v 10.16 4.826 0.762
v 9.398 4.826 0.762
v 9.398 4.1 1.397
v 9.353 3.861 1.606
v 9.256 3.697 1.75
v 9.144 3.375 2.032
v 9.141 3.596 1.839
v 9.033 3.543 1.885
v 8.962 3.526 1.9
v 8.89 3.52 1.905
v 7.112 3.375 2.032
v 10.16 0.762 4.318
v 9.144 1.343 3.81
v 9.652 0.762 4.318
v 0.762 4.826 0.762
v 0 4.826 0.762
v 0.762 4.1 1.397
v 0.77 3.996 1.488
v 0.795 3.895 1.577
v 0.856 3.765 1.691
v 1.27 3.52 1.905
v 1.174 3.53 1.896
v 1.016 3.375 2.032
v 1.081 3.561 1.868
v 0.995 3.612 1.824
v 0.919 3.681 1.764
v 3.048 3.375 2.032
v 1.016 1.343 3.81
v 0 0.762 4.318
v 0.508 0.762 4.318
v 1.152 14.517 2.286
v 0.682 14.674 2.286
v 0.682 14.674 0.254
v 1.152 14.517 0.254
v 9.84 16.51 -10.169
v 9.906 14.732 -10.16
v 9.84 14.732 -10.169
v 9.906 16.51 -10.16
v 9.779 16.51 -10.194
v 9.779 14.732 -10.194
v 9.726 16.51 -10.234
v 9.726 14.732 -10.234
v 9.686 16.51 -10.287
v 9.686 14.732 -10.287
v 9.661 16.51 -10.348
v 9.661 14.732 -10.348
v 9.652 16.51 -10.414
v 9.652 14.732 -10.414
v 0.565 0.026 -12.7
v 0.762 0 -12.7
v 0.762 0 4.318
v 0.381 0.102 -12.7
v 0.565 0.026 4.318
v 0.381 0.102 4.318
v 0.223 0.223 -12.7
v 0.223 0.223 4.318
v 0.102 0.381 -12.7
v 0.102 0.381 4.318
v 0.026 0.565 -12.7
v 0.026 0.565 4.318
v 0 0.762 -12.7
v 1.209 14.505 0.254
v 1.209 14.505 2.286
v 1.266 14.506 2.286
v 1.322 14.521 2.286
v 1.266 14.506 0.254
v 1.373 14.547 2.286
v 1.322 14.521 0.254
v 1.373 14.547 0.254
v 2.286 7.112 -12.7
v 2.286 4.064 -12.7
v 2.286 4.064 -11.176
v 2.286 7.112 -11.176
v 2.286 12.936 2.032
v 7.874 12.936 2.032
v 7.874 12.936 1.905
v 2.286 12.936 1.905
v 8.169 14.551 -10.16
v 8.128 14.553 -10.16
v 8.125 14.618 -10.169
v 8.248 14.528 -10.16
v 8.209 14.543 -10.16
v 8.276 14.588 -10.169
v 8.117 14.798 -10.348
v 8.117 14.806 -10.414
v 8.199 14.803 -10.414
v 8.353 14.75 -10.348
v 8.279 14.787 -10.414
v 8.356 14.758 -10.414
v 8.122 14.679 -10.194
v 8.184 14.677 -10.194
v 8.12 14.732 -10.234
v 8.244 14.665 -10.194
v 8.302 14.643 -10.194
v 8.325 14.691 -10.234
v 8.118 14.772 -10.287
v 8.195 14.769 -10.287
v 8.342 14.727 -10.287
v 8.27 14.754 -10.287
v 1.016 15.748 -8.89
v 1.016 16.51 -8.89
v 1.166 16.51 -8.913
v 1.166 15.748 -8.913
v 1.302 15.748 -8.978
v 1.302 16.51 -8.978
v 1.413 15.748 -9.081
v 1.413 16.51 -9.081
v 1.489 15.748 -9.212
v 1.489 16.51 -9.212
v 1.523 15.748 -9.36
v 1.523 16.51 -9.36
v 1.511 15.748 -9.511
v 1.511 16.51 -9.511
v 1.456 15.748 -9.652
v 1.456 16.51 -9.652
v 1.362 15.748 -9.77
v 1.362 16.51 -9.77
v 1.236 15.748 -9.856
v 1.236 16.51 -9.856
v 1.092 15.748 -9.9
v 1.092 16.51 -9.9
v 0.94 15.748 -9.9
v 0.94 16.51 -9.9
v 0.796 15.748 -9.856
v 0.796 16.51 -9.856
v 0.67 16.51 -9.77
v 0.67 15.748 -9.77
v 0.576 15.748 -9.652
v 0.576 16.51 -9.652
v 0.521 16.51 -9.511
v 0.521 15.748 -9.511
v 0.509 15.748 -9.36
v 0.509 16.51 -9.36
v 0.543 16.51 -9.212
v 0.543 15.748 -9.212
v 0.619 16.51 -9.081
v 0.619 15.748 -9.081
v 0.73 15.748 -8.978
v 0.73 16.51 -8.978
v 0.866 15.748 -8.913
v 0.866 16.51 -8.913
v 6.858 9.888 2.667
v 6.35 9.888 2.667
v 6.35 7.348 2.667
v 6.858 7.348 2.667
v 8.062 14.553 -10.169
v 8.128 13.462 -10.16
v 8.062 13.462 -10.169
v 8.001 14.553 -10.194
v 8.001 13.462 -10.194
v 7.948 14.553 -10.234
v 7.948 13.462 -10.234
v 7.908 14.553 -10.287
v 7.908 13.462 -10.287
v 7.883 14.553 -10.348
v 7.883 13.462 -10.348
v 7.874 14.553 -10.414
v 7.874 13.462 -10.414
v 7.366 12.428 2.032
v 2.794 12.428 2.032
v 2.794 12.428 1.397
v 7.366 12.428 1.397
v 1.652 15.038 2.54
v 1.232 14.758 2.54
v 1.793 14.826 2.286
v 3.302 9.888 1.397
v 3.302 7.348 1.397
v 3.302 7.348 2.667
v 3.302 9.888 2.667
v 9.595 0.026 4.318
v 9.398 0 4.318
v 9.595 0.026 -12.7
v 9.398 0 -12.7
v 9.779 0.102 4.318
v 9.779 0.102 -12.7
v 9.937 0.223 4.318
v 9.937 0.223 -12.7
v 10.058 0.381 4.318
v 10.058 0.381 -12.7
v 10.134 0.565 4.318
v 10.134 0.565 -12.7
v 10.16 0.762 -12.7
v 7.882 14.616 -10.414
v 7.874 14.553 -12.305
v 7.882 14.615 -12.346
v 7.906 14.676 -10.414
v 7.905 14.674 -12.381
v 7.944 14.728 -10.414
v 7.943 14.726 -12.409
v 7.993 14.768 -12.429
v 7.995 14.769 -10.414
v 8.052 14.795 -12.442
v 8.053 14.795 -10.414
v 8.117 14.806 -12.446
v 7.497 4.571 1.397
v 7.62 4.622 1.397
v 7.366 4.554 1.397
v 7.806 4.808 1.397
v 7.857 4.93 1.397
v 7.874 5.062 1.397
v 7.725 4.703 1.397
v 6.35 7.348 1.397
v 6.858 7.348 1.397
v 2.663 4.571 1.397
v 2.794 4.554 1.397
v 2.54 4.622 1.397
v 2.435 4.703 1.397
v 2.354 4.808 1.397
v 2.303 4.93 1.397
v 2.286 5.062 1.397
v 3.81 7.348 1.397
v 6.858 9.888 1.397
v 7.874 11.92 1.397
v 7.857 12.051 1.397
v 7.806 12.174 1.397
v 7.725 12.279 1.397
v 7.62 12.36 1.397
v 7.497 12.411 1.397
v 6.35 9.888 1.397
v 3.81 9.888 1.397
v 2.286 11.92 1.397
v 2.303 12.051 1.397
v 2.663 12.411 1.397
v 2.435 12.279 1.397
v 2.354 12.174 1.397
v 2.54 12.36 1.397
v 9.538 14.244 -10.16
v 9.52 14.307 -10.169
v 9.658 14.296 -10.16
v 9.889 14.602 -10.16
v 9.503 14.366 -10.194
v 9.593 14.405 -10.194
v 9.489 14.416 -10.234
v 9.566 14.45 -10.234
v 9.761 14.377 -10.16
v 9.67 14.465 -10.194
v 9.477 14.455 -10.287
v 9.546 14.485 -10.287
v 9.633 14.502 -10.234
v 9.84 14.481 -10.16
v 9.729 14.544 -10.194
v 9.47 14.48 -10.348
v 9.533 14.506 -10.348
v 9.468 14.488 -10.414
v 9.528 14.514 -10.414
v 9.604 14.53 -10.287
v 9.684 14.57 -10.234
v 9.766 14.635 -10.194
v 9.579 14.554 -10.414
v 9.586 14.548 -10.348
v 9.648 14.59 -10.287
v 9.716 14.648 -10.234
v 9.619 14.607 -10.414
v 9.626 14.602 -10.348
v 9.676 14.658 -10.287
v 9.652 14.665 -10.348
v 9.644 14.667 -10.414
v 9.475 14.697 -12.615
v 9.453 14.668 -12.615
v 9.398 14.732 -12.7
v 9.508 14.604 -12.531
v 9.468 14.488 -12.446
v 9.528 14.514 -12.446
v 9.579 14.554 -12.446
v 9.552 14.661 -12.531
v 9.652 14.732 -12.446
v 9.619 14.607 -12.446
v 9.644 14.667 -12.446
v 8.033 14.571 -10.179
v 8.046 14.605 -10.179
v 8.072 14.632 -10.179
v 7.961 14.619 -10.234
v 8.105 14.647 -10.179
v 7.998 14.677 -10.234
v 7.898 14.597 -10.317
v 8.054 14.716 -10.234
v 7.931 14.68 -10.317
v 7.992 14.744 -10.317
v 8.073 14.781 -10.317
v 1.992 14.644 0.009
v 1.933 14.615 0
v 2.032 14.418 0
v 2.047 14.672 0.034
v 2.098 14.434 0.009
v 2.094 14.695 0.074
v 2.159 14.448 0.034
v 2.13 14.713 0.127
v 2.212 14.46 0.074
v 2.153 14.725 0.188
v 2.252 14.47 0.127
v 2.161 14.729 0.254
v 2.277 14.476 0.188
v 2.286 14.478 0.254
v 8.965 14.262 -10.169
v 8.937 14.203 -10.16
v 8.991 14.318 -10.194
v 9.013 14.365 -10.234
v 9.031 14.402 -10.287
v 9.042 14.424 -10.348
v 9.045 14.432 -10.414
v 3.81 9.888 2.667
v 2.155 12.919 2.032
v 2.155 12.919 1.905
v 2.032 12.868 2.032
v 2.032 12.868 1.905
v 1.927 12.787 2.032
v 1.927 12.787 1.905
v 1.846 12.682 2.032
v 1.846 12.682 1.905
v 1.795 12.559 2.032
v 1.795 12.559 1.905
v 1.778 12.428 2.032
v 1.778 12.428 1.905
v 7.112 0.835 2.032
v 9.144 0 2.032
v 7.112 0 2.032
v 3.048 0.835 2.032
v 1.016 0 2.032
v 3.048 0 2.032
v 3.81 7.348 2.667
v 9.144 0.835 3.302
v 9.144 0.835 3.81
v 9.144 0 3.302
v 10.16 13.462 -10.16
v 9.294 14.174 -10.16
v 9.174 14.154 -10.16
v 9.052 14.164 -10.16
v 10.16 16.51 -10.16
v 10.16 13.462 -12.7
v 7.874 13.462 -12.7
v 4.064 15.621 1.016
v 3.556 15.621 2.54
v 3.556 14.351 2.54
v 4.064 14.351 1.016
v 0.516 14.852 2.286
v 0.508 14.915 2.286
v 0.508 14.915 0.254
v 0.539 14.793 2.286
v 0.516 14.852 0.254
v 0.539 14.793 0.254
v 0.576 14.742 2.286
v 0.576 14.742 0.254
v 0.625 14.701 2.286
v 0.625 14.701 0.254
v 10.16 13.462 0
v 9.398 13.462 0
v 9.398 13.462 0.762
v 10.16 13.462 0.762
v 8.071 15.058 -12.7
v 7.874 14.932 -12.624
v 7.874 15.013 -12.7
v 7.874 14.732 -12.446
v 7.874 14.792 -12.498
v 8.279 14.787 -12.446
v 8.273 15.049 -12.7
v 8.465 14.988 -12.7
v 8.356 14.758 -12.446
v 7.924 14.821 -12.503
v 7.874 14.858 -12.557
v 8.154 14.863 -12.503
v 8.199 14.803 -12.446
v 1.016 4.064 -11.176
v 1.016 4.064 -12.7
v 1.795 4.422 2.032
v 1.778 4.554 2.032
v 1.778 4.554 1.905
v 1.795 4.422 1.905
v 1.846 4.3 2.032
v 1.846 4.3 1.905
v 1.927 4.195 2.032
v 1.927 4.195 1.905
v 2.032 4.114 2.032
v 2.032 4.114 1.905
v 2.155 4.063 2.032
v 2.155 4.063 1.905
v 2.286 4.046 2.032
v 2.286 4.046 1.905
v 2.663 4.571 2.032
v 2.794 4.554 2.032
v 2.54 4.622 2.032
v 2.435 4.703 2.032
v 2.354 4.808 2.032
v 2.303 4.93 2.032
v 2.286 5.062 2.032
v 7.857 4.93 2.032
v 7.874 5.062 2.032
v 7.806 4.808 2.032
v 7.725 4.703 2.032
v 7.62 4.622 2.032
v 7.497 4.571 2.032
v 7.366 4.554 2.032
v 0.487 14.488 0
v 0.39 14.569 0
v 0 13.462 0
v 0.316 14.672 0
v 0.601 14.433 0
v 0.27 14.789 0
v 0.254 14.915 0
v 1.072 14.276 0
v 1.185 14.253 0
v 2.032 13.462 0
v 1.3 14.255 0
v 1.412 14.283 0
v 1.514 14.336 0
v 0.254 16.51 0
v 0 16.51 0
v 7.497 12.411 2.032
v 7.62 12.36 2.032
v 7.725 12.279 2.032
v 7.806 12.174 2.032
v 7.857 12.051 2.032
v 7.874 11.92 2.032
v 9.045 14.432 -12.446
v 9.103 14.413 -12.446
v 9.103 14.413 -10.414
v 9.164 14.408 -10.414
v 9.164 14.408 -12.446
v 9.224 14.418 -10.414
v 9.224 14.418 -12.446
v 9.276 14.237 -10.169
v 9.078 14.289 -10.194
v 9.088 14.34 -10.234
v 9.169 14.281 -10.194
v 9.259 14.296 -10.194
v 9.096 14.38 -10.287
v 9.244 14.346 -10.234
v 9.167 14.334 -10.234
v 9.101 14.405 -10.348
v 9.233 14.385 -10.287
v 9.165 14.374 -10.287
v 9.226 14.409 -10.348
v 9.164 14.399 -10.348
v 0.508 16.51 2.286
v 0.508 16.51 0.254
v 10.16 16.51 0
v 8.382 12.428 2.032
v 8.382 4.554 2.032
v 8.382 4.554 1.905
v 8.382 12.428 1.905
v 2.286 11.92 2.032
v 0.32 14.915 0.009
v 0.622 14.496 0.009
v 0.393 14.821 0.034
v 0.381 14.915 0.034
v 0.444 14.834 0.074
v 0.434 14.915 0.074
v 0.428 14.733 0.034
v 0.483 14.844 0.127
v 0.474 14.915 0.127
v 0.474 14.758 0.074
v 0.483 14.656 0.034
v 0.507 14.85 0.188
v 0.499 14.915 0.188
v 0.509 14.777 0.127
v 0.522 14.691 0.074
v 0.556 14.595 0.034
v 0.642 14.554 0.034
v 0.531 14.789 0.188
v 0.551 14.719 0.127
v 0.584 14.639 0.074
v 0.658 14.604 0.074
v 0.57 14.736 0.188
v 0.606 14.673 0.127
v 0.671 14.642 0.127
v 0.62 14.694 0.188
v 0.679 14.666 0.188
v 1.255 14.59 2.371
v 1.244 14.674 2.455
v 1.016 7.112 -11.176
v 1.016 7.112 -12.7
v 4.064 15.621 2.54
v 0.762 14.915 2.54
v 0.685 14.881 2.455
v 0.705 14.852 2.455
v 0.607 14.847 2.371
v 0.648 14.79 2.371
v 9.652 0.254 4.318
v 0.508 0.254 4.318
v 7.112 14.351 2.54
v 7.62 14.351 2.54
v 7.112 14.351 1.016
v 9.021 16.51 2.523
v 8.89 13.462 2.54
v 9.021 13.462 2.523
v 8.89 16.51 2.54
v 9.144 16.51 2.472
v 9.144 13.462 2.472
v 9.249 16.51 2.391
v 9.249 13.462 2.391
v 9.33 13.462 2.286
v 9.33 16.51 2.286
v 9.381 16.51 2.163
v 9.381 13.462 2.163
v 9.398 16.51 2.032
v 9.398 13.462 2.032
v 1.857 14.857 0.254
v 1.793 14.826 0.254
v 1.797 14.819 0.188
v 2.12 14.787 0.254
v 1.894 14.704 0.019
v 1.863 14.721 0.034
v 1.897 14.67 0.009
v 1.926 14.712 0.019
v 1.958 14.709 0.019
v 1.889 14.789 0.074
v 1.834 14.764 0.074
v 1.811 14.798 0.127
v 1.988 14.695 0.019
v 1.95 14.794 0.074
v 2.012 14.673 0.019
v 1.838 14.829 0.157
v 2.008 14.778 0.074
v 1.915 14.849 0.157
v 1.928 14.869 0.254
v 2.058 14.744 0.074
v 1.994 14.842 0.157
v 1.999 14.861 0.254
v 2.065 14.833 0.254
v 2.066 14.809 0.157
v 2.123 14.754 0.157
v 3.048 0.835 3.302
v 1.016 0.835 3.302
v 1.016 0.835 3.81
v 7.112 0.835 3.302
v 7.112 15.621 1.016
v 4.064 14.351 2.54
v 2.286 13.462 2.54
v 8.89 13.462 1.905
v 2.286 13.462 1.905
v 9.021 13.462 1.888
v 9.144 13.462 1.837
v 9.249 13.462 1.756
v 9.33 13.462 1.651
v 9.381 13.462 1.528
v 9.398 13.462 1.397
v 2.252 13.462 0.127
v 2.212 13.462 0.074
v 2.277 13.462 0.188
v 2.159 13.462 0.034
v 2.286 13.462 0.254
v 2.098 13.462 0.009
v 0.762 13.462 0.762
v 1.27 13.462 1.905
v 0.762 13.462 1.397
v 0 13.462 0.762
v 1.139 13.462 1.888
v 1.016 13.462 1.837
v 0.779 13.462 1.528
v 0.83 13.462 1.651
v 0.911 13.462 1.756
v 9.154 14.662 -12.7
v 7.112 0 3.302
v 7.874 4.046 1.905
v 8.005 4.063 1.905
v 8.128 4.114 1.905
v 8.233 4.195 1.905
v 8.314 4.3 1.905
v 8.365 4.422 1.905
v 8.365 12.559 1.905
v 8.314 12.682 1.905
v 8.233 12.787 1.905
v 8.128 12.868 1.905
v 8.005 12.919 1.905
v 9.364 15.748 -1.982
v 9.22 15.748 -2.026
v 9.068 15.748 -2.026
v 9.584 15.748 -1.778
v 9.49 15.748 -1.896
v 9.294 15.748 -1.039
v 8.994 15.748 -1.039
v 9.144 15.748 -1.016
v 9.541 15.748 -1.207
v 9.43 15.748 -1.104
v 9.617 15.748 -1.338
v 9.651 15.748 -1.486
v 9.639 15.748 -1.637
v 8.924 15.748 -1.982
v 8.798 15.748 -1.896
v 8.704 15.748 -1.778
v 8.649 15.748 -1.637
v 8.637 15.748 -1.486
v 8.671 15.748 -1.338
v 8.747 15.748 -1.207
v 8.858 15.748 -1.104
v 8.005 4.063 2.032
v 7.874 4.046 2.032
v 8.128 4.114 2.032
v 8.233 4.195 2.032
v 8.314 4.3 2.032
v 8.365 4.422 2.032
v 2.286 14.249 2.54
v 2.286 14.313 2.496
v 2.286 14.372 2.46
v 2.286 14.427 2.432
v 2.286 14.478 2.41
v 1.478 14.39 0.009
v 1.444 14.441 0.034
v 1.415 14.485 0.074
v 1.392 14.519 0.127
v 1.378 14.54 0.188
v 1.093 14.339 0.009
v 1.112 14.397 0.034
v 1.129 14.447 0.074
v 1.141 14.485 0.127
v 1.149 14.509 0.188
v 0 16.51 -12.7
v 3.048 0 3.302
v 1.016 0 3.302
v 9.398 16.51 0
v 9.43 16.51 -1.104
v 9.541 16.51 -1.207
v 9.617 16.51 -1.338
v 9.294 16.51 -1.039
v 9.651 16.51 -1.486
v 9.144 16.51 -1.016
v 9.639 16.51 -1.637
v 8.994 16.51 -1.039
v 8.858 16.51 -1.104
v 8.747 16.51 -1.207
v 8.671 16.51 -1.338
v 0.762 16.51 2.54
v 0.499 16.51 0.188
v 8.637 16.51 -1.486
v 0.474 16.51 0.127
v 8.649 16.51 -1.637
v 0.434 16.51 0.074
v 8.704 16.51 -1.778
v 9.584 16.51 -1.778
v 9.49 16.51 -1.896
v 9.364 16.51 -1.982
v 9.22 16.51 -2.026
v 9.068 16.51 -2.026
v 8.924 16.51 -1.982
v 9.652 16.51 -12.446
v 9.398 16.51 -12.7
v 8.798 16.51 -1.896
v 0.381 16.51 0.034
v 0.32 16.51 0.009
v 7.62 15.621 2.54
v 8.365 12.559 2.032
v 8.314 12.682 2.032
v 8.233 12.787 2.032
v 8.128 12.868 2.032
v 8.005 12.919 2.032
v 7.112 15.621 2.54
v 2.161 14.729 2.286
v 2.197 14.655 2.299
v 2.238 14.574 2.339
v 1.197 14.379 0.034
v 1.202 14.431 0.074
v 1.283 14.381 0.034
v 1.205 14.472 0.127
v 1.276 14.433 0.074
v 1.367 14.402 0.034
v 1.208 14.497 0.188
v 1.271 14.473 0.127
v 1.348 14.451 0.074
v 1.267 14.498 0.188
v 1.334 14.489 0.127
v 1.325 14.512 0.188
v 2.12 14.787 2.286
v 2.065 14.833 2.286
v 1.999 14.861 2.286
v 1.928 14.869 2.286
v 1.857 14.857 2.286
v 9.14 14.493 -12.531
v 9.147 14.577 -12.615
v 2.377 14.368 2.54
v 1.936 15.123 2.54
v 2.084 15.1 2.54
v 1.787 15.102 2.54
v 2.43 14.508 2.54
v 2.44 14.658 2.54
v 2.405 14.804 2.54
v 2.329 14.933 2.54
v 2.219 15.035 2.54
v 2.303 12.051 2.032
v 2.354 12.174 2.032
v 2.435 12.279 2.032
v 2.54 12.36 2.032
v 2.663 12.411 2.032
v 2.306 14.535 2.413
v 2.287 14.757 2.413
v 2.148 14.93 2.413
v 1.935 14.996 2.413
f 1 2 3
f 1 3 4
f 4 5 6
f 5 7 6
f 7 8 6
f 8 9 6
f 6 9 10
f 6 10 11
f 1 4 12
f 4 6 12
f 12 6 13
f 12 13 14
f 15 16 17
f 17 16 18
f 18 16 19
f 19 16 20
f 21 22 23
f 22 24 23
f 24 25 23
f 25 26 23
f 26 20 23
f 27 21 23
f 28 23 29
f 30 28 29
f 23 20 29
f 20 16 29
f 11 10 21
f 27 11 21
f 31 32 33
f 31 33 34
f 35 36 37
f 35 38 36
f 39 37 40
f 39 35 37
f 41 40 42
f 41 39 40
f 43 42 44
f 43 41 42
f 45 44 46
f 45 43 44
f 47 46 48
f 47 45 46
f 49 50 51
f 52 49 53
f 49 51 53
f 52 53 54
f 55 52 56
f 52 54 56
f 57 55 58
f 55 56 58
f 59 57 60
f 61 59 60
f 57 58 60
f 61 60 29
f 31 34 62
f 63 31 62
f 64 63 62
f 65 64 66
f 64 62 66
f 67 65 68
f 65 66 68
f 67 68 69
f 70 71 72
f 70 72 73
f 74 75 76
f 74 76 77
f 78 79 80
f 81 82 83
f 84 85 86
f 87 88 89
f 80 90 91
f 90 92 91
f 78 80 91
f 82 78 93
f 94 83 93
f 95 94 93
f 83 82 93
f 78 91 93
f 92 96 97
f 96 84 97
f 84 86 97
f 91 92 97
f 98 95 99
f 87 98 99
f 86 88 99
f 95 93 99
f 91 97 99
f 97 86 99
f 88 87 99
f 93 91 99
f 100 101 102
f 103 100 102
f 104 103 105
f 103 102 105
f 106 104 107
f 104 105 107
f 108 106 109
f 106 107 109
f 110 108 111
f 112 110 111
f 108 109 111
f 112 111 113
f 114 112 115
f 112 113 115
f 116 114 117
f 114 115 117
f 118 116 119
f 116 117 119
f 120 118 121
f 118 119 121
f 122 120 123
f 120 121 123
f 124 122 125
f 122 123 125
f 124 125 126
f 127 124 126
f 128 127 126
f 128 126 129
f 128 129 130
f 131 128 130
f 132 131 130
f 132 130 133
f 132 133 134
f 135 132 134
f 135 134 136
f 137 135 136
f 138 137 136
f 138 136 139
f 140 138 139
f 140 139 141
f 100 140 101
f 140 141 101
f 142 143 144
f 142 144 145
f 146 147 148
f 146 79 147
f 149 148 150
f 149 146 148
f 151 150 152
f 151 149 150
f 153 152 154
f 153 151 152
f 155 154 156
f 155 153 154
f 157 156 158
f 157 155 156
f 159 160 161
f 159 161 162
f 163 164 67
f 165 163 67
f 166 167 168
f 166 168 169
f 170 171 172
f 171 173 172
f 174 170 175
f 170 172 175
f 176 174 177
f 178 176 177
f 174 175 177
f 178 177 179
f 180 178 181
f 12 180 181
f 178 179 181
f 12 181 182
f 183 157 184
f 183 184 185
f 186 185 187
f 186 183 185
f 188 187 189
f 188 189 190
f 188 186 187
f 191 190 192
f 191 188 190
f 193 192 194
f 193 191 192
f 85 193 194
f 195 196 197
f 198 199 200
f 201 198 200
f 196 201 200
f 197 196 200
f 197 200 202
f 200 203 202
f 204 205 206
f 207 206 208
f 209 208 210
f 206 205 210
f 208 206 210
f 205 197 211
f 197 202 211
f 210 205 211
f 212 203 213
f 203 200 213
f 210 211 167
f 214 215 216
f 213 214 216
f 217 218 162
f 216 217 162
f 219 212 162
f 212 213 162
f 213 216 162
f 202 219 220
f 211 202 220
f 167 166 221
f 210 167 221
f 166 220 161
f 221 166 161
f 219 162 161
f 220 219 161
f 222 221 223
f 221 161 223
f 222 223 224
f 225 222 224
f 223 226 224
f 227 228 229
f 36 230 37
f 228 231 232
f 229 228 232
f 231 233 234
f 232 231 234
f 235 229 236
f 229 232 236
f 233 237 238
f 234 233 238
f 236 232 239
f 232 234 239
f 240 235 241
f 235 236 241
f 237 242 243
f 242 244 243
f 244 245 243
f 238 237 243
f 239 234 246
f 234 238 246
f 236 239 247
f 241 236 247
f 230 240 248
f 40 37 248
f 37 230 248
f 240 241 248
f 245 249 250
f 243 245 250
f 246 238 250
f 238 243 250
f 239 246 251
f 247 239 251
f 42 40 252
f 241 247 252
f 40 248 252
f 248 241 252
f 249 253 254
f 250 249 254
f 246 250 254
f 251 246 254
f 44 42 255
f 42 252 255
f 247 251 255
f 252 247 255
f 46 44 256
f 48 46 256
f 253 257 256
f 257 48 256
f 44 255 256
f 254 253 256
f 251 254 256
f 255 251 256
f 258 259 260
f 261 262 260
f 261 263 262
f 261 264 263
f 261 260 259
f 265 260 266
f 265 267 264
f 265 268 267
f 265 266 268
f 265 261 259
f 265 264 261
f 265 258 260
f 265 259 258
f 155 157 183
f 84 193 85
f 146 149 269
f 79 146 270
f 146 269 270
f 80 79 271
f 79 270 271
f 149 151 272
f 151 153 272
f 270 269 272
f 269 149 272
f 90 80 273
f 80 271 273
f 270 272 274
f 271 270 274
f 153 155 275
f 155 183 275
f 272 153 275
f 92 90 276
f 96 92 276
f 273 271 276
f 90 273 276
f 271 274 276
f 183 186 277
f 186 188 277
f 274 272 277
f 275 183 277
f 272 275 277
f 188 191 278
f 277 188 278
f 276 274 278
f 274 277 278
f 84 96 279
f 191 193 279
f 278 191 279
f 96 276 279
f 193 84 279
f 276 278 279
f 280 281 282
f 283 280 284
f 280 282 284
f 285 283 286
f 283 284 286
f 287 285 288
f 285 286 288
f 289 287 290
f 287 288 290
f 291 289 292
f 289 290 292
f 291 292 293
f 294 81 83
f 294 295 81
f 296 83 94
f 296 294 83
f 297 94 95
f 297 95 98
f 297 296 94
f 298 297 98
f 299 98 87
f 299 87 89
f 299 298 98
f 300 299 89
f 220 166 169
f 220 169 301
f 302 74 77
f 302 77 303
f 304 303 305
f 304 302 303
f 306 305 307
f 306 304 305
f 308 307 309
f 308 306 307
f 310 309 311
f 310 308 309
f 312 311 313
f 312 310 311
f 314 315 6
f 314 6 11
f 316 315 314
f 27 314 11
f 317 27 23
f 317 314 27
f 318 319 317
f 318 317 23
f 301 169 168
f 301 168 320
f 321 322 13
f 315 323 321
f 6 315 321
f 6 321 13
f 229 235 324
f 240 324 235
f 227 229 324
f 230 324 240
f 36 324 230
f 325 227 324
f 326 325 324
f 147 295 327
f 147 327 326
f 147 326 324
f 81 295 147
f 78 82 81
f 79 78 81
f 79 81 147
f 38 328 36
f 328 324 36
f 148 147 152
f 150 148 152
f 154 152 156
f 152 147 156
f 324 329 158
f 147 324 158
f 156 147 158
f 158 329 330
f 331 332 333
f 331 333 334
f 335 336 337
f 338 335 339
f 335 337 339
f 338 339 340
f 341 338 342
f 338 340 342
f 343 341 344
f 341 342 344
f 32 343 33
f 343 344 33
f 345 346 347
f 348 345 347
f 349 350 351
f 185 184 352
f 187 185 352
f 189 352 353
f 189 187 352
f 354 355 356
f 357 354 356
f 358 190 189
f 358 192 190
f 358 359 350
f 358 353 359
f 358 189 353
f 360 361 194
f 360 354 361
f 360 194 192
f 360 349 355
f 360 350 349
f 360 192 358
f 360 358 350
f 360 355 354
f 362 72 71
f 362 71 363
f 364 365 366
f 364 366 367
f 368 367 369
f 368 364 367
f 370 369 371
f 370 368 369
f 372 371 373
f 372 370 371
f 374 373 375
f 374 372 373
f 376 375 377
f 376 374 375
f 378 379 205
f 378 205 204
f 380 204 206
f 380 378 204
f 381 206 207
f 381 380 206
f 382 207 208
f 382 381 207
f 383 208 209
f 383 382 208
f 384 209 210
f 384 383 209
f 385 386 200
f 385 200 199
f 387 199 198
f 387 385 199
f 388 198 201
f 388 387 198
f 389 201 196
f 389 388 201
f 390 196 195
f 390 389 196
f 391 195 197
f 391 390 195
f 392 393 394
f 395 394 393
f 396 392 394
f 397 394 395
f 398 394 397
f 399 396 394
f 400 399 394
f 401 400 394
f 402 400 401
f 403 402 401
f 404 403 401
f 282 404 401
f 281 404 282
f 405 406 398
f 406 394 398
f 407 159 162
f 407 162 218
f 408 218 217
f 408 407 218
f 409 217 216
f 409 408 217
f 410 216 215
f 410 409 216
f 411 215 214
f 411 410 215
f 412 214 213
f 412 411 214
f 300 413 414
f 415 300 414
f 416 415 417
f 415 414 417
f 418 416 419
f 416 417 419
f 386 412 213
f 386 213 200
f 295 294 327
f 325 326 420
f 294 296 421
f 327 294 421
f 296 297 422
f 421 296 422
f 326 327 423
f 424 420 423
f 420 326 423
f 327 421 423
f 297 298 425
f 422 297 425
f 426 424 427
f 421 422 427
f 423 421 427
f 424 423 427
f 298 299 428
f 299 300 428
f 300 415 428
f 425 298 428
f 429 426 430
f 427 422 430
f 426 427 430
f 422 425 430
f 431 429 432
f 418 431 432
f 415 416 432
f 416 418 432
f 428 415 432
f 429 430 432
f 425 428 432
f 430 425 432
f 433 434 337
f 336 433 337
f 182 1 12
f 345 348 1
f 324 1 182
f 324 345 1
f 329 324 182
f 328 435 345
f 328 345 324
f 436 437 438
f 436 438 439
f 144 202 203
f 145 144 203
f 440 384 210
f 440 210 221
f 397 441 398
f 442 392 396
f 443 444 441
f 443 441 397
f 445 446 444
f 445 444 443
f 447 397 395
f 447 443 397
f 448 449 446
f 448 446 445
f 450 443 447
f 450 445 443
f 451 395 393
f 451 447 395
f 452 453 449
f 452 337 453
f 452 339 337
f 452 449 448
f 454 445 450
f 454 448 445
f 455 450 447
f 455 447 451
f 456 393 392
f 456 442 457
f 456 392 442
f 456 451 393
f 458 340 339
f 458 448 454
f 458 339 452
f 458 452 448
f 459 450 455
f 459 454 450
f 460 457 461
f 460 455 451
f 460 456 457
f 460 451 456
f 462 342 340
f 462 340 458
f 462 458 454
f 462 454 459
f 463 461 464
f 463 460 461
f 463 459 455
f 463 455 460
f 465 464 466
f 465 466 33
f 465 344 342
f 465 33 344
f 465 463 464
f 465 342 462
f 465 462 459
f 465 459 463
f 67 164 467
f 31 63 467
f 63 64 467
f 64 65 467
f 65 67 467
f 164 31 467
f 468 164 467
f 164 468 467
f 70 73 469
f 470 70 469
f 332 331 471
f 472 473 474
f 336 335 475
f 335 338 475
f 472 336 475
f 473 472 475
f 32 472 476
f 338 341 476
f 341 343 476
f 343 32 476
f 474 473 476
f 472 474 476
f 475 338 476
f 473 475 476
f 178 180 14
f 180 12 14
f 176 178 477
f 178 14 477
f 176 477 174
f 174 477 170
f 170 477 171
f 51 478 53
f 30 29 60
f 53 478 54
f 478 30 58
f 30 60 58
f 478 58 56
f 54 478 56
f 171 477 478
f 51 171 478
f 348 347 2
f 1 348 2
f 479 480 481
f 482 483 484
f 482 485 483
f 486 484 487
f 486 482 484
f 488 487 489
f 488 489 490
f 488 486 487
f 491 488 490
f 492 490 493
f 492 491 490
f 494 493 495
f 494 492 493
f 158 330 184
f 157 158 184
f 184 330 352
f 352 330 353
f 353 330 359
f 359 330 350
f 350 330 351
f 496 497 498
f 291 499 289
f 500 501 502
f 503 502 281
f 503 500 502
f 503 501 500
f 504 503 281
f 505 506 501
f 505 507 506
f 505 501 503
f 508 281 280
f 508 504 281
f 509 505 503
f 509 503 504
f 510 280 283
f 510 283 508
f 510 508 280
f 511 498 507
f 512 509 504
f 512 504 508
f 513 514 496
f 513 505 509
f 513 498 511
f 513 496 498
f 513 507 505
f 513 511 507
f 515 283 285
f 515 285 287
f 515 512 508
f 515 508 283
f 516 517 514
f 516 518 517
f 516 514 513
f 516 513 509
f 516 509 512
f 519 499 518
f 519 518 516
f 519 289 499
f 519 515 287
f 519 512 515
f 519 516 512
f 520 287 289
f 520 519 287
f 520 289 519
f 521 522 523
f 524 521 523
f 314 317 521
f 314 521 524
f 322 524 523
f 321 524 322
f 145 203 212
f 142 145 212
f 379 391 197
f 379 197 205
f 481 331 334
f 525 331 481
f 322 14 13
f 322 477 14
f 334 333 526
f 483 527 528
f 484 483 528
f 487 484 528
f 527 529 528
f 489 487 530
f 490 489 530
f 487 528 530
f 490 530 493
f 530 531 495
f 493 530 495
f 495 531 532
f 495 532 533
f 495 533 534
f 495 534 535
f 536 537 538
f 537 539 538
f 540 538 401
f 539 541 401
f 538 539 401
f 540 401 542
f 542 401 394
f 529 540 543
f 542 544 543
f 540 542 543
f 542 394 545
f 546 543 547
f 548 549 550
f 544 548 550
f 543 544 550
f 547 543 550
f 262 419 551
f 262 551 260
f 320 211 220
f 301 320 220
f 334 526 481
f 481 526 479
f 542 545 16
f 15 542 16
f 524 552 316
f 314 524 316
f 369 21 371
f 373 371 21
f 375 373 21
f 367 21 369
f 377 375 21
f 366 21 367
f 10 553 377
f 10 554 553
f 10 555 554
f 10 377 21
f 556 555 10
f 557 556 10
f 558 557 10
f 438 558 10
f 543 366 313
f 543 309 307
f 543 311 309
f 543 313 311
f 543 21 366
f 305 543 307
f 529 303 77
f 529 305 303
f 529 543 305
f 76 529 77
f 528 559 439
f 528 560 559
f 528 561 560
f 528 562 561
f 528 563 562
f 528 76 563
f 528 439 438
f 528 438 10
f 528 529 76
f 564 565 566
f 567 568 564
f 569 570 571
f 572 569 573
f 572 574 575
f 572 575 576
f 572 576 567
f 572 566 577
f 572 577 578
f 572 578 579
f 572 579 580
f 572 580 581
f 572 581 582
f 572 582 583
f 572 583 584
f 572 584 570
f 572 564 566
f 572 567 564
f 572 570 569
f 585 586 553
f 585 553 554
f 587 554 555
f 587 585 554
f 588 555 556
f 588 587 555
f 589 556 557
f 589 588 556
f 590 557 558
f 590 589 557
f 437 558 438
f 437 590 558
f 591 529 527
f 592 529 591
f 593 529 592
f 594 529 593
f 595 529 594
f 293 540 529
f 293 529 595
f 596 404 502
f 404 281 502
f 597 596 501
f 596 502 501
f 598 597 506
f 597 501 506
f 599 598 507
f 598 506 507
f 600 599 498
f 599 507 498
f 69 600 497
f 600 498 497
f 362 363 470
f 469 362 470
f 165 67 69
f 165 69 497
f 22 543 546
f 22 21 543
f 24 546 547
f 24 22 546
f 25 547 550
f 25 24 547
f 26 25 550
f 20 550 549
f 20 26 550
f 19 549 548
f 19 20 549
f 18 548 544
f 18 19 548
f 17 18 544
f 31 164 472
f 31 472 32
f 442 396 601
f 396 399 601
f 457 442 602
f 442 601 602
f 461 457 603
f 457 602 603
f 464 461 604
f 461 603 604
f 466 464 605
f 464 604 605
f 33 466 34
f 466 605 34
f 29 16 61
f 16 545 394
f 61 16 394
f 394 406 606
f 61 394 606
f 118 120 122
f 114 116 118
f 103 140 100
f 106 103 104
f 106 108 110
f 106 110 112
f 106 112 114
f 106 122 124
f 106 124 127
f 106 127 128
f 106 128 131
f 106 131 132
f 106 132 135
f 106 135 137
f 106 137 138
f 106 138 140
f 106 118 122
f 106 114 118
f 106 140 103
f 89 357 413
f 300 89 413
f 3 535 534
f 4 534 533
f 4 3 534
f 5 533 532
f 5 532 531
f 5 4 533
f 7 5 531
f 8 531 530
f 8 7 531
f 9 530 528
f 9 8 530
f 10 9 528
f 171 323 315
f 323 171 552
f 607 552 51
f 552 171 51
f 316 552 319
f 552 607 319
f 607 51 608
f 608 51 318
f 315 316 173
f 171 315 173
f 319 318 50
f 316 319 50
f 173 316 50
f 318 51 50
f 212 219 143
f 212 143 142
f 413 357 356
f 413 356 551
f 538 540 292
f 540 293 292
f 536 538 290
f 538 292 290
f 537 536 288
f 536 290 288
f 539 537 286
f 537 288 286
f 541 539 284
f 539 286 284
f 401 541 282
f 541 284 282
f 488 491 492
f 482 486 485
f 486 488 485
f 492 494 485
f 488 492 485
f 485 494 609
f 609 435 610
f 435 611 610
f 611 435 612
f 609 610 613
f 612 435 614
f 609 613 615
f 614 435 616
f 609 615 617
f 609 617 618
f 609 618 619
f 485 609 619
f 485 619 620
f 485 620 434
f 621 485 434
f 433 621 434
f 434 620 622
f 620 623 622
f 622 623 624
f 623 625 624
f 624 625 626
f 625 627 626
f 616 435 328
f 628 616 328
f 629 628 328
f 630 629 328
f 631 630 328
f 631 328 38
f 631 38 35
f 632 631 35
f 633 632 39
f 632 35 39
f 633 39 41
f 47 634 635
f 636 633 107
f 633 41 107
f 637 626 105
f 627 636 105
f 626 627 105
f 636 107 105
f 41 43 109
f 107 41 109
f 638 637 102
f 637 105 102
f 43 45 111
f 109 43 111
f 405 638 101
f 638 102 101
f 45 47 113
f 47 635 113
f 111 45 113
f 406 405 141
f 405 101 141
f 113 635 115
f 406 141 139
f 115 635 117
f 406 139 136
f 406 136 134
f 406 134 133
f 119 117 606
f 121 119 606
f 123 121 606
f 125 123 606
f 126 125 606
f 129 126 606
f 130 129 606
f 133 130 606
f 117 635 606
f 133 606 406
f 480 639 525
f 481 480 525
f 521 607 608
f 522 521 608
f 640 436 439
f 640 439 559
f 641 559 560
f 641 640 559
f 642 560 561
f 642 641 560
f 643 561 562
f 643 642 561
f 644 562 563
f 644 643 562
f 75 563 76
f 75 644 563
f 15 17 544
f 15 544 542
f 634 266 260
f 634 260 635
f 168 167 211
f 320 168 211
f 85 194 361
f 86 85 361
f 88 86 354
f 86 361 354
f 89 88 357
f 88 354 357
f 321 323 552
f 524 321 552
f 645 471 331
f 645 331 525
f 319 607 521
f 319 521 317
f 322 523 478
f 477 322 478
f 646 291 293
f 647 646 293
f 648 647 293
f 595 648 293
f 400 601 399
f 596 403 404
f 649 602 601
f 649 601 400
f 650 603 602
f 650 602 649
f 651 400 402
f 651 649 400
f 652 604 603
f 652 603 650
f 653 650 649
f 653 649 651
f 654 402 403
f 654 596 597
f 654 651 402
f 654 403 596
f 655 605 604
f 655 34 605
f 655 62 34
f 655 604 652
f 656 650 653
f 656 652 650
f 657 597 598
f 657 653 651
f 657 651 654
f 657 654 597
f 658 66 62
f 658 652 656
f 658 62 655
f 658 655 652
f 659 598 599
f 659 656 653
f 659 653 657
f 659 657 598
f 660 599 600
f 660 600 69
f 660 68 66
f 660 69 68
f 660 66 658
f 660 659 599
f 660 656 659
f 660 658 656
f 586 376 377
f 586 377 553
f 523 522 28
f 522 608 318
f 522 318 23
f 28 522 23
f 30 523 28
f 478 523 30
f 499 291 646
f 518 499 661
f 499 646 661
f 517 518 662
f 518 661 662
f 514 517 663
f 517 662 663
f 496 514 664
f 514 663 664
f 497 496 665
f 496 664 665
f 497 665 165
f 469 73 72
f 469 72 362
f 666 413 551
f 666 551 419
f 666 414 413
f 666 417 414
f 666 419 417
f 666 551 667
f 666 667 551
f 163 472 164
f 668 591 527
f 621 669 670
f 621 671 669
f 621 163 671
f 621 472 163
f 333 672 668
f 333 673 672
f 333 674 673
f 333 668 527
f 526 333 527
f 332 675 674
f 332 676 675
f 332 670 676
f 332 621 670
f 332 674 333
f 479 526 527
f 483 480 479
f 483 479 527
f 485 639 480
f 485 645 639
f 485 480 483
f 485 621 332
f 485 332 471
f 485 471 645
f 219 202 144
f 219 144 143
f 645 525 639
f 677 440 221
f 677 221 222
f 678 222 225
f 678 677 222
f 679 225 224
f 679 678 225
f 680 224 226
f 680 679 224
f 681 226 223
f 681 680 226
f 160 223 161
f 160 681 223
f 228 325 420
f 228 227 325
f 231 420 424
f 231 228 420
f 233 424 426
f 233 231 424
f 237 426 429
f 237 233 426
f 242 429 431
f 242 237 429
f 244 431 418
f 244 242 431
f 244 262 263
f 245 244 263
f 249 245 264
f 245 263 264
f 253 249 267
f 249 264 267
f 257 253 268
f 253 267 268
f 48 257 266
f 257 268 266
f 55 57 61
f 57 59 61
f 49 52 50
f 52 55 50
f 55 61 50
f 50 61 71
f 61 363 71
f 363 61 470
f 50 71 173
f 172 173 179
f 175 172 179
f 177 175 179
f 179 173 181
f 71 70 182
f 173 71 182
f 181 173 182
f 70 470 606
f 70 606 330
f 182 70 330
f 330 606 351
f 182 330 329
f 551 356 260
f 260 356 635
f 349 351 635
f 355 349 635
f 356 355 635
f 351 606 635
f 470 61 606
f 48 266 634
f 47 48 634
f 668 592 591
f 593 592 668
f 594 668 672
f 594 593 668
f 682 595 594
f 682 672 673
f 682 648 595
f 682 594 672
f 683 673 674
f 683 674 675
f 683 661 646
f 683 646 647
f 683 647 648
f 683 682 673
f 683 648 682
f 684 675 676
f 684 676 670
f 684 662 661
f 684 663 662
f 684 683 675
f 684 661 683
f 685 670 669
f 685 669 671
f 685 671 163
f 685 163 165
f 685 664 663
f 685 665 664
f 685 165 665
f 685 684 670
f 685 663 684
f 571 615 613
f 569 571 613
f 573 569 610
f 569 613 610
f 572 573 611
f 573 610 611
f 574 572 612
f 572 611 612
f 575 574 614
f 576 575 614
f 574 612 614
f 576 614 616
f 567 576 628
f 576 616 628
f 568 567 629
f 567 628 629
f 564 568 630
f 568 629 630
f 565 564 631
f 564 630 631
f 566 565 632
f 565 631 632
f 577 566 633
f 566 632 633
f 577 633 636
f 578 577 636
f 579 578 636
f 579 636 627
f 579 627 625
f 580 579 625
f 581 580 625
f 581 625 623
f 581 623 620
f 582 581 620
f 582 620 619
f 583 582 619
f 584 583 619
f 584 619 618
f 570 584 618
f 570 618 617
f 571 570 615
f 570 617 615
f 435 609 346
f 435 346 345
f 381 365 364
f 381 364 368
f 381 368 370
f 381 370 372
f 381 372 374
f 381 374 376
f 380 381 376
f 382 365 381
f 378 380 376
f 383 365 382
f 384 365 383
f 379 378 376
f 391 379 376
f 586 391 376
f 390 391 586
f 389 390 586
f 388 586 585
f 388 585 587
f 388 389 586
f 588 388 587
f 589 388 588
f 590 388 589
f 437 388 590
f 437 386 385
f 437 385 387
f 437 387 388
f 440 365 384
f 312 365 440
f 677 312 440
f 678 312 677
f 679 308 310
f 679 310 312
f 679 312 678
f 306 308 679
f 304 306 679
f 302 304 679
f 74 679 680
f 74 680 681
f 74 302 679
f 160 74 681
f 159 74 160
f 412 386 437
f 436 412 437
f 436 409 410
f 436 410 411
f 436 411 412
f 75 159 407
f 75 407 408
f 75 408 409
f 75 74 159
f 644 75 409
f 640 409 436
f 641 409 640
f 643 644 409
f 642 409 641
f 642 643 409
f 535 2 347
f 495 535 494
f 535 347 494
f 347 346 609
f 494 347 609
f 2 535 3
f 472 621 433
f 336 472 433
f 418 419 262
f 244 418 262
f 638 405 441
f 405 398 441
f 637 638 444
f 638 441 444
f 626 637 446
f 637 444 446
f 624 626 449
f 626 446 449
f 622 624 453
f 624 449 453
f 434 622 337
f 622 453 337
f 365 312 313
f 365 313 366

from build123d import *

# Parameters (mm, degrees)
SKETCH1_W           = 10.16
SKETCH1_H           = 16.51
BOSS_EXTRUDE1_DEPTH = 12.7
BOSS_EXTRUDE2_DEPTH = 10.16
SKETCH3_W           = 1.27
SKETCH3_H           = 3.048
CUT_EXTRUDE1_DEPTH  = 1.524
CUT_EXTRUDE2_DEPTH  = 2.54
SKETCH6_W           = 2.032
SKETCH6_H           = 1.27
CUT_EXTRUDE5_DEPTH  = 24.17532524
SKETCH8_W           = 8.128
SKETCH8_H           = 2.032
CUT_EXTRUDE6_DEPTH  = 2.54
CUT_EXTRUDE7_DEPTH  = 8.128
CUT_EXTRUDE8_START  = -1.778
SKETCH10_W          = 8.128
SKETCH10_H          = 0.508
CUT_EXTRUDE8_DEPTH  = 1.778
CUT_EXTRUDE9_DEPTH  = 1.778
BOSS_EXTRUDE3_REACH = 23.113
SKETCH12_W          = 8.636
SKETCH12_H          = 1.143
CUT_EXTRUDE10_DEPTH = 0.508
BOSS_EXTRUDE4_START = 0.127
BOSS_EXTRUDE4_DEPTH = 0.127
SKETCH16_W          = 0.508
SKETCH16_H          = 2.54
BOSS_EXTRUDE5_DEPTH = 1.27
SKETCH18_W          = 7.112
SKETCH18_H          = 3.048
BOSS_EXTRUDE6_DEPTH = 2.54
SKETCH19_W          = 3.048
SKETCH19_H          = 1.27
CUT_EXTRUDE11_DEPTH = 1.524
CUT_EXTRUDE12_DEPTH = 1.524
SKETCH22_R          = 0.508
CUT_EXTRUDE13_DEPTH = 0.762
BOSS_EXTRUDE8_DEPTH = 2.54
FILLET1_R           = 0.762
FILLET2_R           = 0.508
FILLET3_R           = 0.508
FILLET4_R           = 0.254
CHAMFER2_SIZE       = 0.254
FILLET5_R           = 0.254
CHAMFER3_SIZE       = 0.254
FILLET6_R           = 0.254
FILLET8_R           = 0.254


# Some blends are built 0.0001 mm under size
with BuildPart() as part:
    # Sketch1 → Boss-Extrude1 (new body)
    with BuildSketch(Plane.XY):
        with Locations((5.08, 8.255)):
            Rectangle(SKETCH1_W, SKETCH1_H)
    extrude(amount=-BOSS_EXTRUDE1_DEPTH)

    # Sketch2 → Boss-Extrude2 (add)
    with BuildSketch(Plane.ZY):
        Polygon((0, 13.462), (0.762, 13.462), (0.762, 4.826), (4.318, 0.762), (4.318, 0), (0, 0), align=None)
    extrude(amount=-BOSS_EXTRUDE2_DEPTH)

    # Sketch3 → Cut-Extrude1 (cut)
    with BuildSketch(Plane(origin=(0, 0, -12.7), x_dir=(-1, 0, 0), z_dir=(0, 0, -1))):
        with Locations((-1.651, 5.588)):
            Rectangle(SKETCH3_W, SKETCH3_H)
    extrude(amount=-CUT_EXTRUDE1_DEPTH, mode=Mode.SUBTRACT)

    # Sketch4 → Cut-Extrude2 (cut)
    with BuildSketch(Plane(origin=(0, 0, -12.7), x_dir=(-1, 0, 0), z_dir=(0, 0, -1))):
        with BuildLine():
            Line((-10.16, 13.462), (-7.874, 13.462))
            Line((-7.874, 13.462), (-7.874, 14.732))
            ThreePointArc((-7.874, 14.732), (-8.111909378, 14.806021803), (-8.356399754, 14.758016014))
            Line((-8.356399754, 14.758016014), (-9.045285349, 14.432315787))
            ThreePointArc((-9.045285349, 14.432315787), (-9.133273497, 14.40877931), (-9.223907772, 14.41779641))
            Line((-9.223907772, 14.41779641), (-9.468055681, 14.487852091))
            ThreePointArc((-9.468055681, 14.487852091), (-9.600867128, 14.579157177), (-9.652, 14.732))
            Line((-9.652, 14.732), (-9.652, 16.51))
            Line((-9.652, 16.51), (-10.16, 16.51))
            Line((-10.16, 16.51), (-10.16, 13.462))
        make_face()
    extrude(amount=-CUT_EXTRUDE2_DEPTH, mode=Mode.SUBTRACT)

    # Sketch6 → Cut-Extrude5 (cut, through all)
    with BuildSketch(Plane(origin=(0, 0, 0), x_dir=(-1, 0, 0), z_dir=(0, -1, 0))):
        with Locations((-2.032, -2.667)):
            Rectangle(SKETCH6_W, SKETCH6_H)
        with Locations((-8.128, -2.667)):
            Rectangle(SKETCH6_W, SKETCH6_H)
    extrude(amount=-CUT_EXTRUDE5_DEPTH, mode=Mode.SUBTRACT)

    # Sketch8 → Cut-Extrude6 (cut)
    with BuildSketch(Plane.XY.offset(2.032)):
        with Locations((5.08, 2.358571429)):
            Rectangle(SKETCH8_W, SKETCH8_H)
    extrude(amount=CUT_EXTRUDE6_DEPTH, mode=Mode.SUBTRACT)

    # 3DSketch3 → Cut-Extrude7 (cut, along a direction that is not the sketch's normal)
    with BuildSketch(Plane(origin=(0.508, 0.762, 4.318), x_dir=(0.5499719409228688, 0.6285393610547091, -0.5499719409228716), z_dir=(-0.7071067811865493, 0, -0.7071067811865457))):
        Polygon((0, 0), (-0.319297995, 0.395111111), (0.604385491, 0.395111111), (0.923683487, 0), align=None)
    extrude(amount=-CUT_EXTRUDE7_DEPTH, dir=(-1, 0, 0), mode=Mode.SUBTRACT)

    # Sketch10 → Cut-Extrude8 (cut)
    with BuildSketch(Plane.XY.offset(3.81).offset(CUT_EXTRUDE8_START)):
        with Locations((5.08, 1.088571429)):
            Rectangle(SKETCH10_W, SKETCH10_H)
    extrude(amount=CUT_EXTRUDE8_DEPTH, mode=Mode.SUBTRACT)

    # 3DSketch6 → Cut-Extrude9 (cut, along a direction that is not the sketch's normal)
    with BuildSketch(Plane(origin=(9.652, 0.762, 4.318), x_dir=(-0.5499719409228674, 0.6285393610547109, -0.5499719409228712), z_dir=(-0.7071067811865499, 0, 0.7071067811865451))):
        Polygon((0, 0), (0.923683487, 0), (0.604385491, 0.395111111), (-0.319297995, 0.395111111), align=None)
    extrude(amount=CUT_EXTRUDE9_DEPTH, dir=(-1, 0, 0), mode=Mode.SUBTRACT)

    # Boss-Extrude3: up to this plane
    boss_extrude3_end = Plane(origin=(10.16, 0.762, 4.318), z_dir=(0, 0.6585046078685179, 0.752576694706878))
    # Sketch12 → Boss-Extrude3 (add, up to the surface)
    with BuildSketch(Plane(origin=(0, 13.462, 0), x_dir=(1, 0, 0), z_dir=(0, 1, 0)), mode=Mode.PRIVATE) as boss_extrude3_sk1:
        with Locations((5.08, -1.3335)):
            Rectangle(SKETCH12_W, SKETCH12_H)
    boss_extrude3_tool1 = split(extrude(boss_extrude3_sk1.sketch, amount=-BOSS_EXTRUDE3_REACH, mode=Mode.PRIVATE), bisect_by=boss_extrude3_end, keep=Keep.BOTH, mode=Mode.PRIVATE)
    add(boss_extrude3_tool1.solids().sort_by_distance((5.08, 13.462, 1.3335))[0])

    # Sketch13 → Cut-Extrude10 (cut)
    with BuildSketch(Plane.XY.offset(1.905)):
        with BuildLine():
            Line((2.794, 12.427857143), (7.366, 12.427857143))
            ThreePointArc((7.366, 12.427857143), (7.725210245, 12.279067388), (7.874, 11.919857143))
            Line((7.874, 11.919857143), (7.874, 5.061857143))
            ThreePointArc((7.874, 5.061857143), (7.725210245, 4.702646898), (7.366, 4.553857143))
            Line((7.366, 4.553857143), (2.794, 4.553857143))
            ThreePointArc((2.794, 4.553857143), (2.434789755, 4.702646898), (2.286, 5.061857143))
            Line((2.286, 5.061857143), (2.286, 11.919857143))
            ThreePointArc((2.286, 11.919857143), (2.434789755, 12.279067388), (2.794, 12.427857143))
        make_face()
    extrude(amount=-CUT_EXTRUDE10_DEPTH, mode=Mode.SUBTRACT)

    # Sketch14 → Boss-Extrude4 (add)
    with BuildSketch(Plane.XY.offset(1.905).offset(BOSS_EXTRUDE4_START)):
        with BuildLine():
            Line((2.286, 4.045857143), (7.874, 4.045857143))
            ThreePointArc((7.874, 4.045857143), (8.233210245, 4.194646898), (8.382, 4.553857143))
            Line((8.382, 4.553857143), (8.382, 12.427857143))
            ThreePointArc((8.382, 12.427857143), (8.233210245, 12.787067388), (7.874, 12.935857143))
            Line((7.874, 12.935857143), (2.286, 12.935857143))
            ThreePointArc((2.286, 12.935857143), (1.926789755, 12.787067388), (1.778, 12.427857143))
            Line((1.778, 12.427857143), (1.778, 4.553857143))
            ThreePointArc((1.778, 4.553857143), (1.926789755, 4.194646898), (2.286, 4.045857143))
        make_face()
        with BuildLine():
            Line((2.794, 12.427857143), (7.366, 12.427857143))
            ThreePointArc((7.366, 12.427857143), (7.725210245, 12.279067388), (7.874, 11.919857143))
            Line((7.874, 11.919857143), (7.874, 5.061857143))
            ThreePointArc((7.874, 5.061857143), (7.725210245, 4.702646898), (7.366, 4.553857143))
            Line((7.366, 4.553857143), (2.794, 4.553857143))
            ThreePointArc((2.794, 4.553857143), (2.434789755, 4.702646898), (2.286, 5.061857143))
            Line((2.286, 5.061857143), (2.286, 11.919857143))
            ThreePointArc((2.286, 11.919857143), (2.434789755, 12.279067388), (2.794, 12.427857143))
        make_face(mode=Mode.SUBTRACT)
    extrude(amount=-BOSS_EXTRUDE4_DEPTH)

    # Sketch16 → Boss-Extrude5 (add)
    with BuildSketch(Plane.XY.offset(1.397)):
        with Locations((3.556, 8.617857143)):
            Rectangle(SKETCH16_W, SKETCH16_H)
        with Locations((6.604, 8.617857143)):
            Rectangle(SKETCH16_W, SKETCH16_H)
    extrude(amount=BOSS_EXTRUDE5_DEPTH)

    # Sketch18 → Boss-Extrude6 (add)
    with BuildSketch(Plane.XY):
        with Locations((5.842, 14.986)):
            Rectangle(SKETCH18_W, SKETCH18_H)
    extrude(amount=BOSS_EXTRUDE6_DEPTH)

    # Sketch19 → Cut-Extrude11 (cut)
    with BuildSketch(Plane.XY.offset(2.54)):
        with Locations((5.588, 14.986)):
            Rectangle(SKETCH19_W, SKETCH19_H)
    extrude(amount=-CUT_EXTRUDE11_DEPTH, mode=Mode.SUBTRACT)

    # 3DSketch8 → Cut-Extrude12 (cut, along a direction that is not the sketch's normal)
    with BuildSketch(Plane(origin=(4.064, 15.621, 1.016), x_dir=(-0.24806946917841682, -0.6201736729460425, 0.7442084075352507), z_dir=(-0.9486832980505139, 0, -0.31622776601683783))):
        Polygon((0, 0), (1.260192903, 0.996269967), (2.047813468, 0), (0.787620565, -0.996269967), align=None)
    cut_extrude12 = extrude(amount=-CUT_EXTRUDE12_DEPTH, dir=(-1, 0, 0), mode=Mode.SUBTRACT)

    # Mirror1: Cut-Extrude12 across plane
    add(cut_extrude12.mirror(Plane(origin=(5.588, 0, 0), x_dir=(0, 0, 1), z_dir=(1, 0, 0))), mode=Mode.SUBTRACT)

    # Sketch22 → Cut-Extrude13 (cut)
    with BuildSketch(Plane(origin=(0, 16.51, 0), x_dir=(1, 0, 0), z_dir=(0, 1, 0))):
        with Locations(Location((9.144, 1.524, 0), (0, 0, 270))):
            Circle(SKETCH22_R)
        with Locations(Location((1.016, 9.398, 0), (0, 0, 270))):
            Circle(SKETCH22_R)
    extrude(amount=-CUT_EXTRUDE13_DEPTH, mode=Mode.SUBTRACT)

    # Sketch23 → Boss-Extrude8 (add)
    with BuildSketch(Plane.XY):
        with BuildLine():
            Line((2.286, 16.51), (0.508, 16.51))
            Line((0.508, 16.51), (0.508, 14.915072842))
            ThreePointArc((0.508, 14.915072842), (0.555944485, 14.76655643), (0.681678147, 14.674107284))
            Line((0.681678147, 14.674107284), (1.152147648, 14.517284117))
            ThreePointArc((1.152147648, 14.517284117), (1.266183721, 14.506497115), (1.37336335, 14.5469089))
            Line((1.37336335, 14.5469089), (2.032, 14.986))
            Line((2.032, 14.986), (2.286, 14.478))
            Line((2.286, 14.478), (2.286, 16.51))
        make_face()
    extrude(amount=BOSS_EXTRUDE8_DEPTH)

    # Fillet1
    fillet1_edges = [part.edges().sort_by_distance(p)[0] for p in [
        (10.16, 0, -4.191),
        (0, 0, -4.191),
    ]]
    fillet(fillet1_edges, radius=FILLET1_R)

    # Fillet2
    fillet2_edges = [part.edges().sort_by_distance(p)[0] for p in [
        (9.398, 8.490857143, 1.905),
        (0.762, 8.490857143, 1.905),
    ]]
    fillet(fillet2_edges, radius=FILLET2_R)

    # Fillet3
    fillet3_edges = [part.edges().sort_by_distance(p)[0] for p in [
        (9.398, 14.986, 2.54),
    ]]
    fillet(fillet3_edges, radius=FILLET3_R)

    # Fillet4
    fillet4_edges = [part.edges().sort_by_distance(p)[0] for p in [
        (2.032, 14.986, 1.27),
    ]]
    fillet(fillet4_edges, radius=FILLET4_R)

    # Chamfer2
    # the kernel refuses this chamfer: 0.254 mm, written as the material it takes off along each edge
    with BuildSketch(Plane(origin=(1.933490778, 14.615057177, 2.54), x_dir=(-0.512799244946166, -0.8585085523060572, 0), z_dir=(-0.8585085523060572, 0.512799244946166, 0))) as chamfer2_piece_1:
        Polygon((0.254 + CHAMFER2_SIZE, 0), (0.254, -CHAMFER2_SIZE), (0.254, 0), align=None)
    revolve(axis=Axis((1.933490778, 14.615057177, 2.54), (0, 0, 1)), revolution_arc=244.54053411, mode=Mode.SUBTRACT)
    with BuildSketch(Plane(origin=(1.37336335, 14.5469089, 2.54), x_dir=(-0.5547001962252276, 0.8320502943378448, 0), z_dir=(0.8320502943378448, 0.5547001962252276, 0))) as chamfer2_piece_2:
        Polygon((CHAMFER2_SIZE, 0), (0, -CHAMFER2_SIZE), (0, 0), align=None)
    extrude(amount=0.503856054, mode=Mode.SUBTRACT)
    with BuildSketch(Plane(origin=(1.232469501, 14.758249675, 2.54), x_dir=(-0.31622776601683666, -0.9486832980505143, 0), z_dir=(-0.9486832980505143, 0.31622776601683666, 0))) as chamfer2_piece_3:
        Polygon((0.254 - CHAMFER2_SIZE, 0), (0.254, -CHAMFER2_SIZE), (0.254, 0), align=None)
    revolve(axis=Axis((1.232469501, 14.758249675, 2.54), (0, 0, 1)), revolution_arc=52.125016349, mode=Mode.SUBTRACT)
    with BuildSketch(Plane(origin=(0.681678147, 14.674107284, 2.54), x_dir=(0.3162277660168374, 0.948683298050514, 0), z_dir=(0.948683298050514, -0.3162277660168374, 0))) as chamfer2_piece_4:
        Polygon((CHAMFER2_SIZE, 0), (0, -CHAMFER2_SIZE), (0, 0), align=None)
    extrude(amount=0.495918397, mode=Mode.SUBTRACT)
    with BuildSketch(Plane(origin=(0.762, 14.915072842, 2.54), x_dir=(-1, 0, 0), z_dir=(0, 1, 0))) as chamfer2_piece_5:
        Polygon((0.254 - CHAMFER2_SIZE, 0), (0.254, -CHAMFER2_SIZE), (0.254, 0), align=None)
    revolve(axis=Axis((0.762, 14.915072842, 2.54), (0, 0, 1)), revolution_arc=71.565051177, mode=Mode.SUBTRACT)
    with BuildSketch(Plane(origin=(0.508, 17.163207479, 2.54), x_dir=(1, 0, 0), z_dir=(0, -1, 0))) as chamfer2_piece_6:
        Polygon((CHAMFER2_SIZE, 0), (0, -CHAMFER2_SIZE), (0, 0), align=None)
    extrude(amount=2.248134637, mode=Mode.SUBTRACT)

    # Fillet5
    fillet5_edges = [part.edges().sort_by_distance(p)[0] for p in [
        (2.223337642, 14.603324715, 0),
        (1.998684434, 14.860548088, 0),
        (1.582980139, 14.686653426, 0),
        (1.266183721, 14.506497115, 0),
        (0.916912898, 14.595695701, 0),
        (0.555944485, 14.76655643, 0),
        (0.508, 15.712536421, 0),
        (2.286, 13.97, 0),
    ]]
    fillet(fillet5_edges, radius=FILLET5_R)

    # Chamfer3
    chamfer3_edges = [part.edges().sort_by_distance(p)[0] for p in [
        (8.111909378, 14.806021803, -12.7),
        (8.700842551, 14.595165901, -12.7),
        (9.133273497, 14.40877931, -12.7),
        (9.345981727, 14.45282425, -12.7),
        (9.600867128, 14.579157177, -12.7),
        (9.652, 15.621, -12.7),
    ]]
    chamfer(chamfer3_edges, length=CHAMFER3_SIZE - 0.0001)  # a hair under: the kernel refuses the full size

    # Fillet6
    fillet6_edges = [part.edges().sort_by_distance(p)[0] for p in [
        (7.874, 14.732, -11.30305),
    ]]
    fillet(fillet6_edges, radius=FILLET6_R)

    # Fillet8
    fillet8_edges = [part.edges().sort_by_distance(p)[0] for p in [
        (9.652, 15.621, -10.16),
        (9.600867128, 14.579157177, -10.16),
        (9.345981727, 14.45282425, -10.16),
        (9.133273497, 14.40877931, -10.16),
        (8.239512108, 14.796769766, -10.16),
        (8.700842551, 14.595165901, -10.16),
        (7.944454866, 14.728085686, -10.16),
        (7.874, 14.007254484, -10.16),
    ]]
    fillet(fillet8_edges, radius=FILLET8_R)


solid = part.part
